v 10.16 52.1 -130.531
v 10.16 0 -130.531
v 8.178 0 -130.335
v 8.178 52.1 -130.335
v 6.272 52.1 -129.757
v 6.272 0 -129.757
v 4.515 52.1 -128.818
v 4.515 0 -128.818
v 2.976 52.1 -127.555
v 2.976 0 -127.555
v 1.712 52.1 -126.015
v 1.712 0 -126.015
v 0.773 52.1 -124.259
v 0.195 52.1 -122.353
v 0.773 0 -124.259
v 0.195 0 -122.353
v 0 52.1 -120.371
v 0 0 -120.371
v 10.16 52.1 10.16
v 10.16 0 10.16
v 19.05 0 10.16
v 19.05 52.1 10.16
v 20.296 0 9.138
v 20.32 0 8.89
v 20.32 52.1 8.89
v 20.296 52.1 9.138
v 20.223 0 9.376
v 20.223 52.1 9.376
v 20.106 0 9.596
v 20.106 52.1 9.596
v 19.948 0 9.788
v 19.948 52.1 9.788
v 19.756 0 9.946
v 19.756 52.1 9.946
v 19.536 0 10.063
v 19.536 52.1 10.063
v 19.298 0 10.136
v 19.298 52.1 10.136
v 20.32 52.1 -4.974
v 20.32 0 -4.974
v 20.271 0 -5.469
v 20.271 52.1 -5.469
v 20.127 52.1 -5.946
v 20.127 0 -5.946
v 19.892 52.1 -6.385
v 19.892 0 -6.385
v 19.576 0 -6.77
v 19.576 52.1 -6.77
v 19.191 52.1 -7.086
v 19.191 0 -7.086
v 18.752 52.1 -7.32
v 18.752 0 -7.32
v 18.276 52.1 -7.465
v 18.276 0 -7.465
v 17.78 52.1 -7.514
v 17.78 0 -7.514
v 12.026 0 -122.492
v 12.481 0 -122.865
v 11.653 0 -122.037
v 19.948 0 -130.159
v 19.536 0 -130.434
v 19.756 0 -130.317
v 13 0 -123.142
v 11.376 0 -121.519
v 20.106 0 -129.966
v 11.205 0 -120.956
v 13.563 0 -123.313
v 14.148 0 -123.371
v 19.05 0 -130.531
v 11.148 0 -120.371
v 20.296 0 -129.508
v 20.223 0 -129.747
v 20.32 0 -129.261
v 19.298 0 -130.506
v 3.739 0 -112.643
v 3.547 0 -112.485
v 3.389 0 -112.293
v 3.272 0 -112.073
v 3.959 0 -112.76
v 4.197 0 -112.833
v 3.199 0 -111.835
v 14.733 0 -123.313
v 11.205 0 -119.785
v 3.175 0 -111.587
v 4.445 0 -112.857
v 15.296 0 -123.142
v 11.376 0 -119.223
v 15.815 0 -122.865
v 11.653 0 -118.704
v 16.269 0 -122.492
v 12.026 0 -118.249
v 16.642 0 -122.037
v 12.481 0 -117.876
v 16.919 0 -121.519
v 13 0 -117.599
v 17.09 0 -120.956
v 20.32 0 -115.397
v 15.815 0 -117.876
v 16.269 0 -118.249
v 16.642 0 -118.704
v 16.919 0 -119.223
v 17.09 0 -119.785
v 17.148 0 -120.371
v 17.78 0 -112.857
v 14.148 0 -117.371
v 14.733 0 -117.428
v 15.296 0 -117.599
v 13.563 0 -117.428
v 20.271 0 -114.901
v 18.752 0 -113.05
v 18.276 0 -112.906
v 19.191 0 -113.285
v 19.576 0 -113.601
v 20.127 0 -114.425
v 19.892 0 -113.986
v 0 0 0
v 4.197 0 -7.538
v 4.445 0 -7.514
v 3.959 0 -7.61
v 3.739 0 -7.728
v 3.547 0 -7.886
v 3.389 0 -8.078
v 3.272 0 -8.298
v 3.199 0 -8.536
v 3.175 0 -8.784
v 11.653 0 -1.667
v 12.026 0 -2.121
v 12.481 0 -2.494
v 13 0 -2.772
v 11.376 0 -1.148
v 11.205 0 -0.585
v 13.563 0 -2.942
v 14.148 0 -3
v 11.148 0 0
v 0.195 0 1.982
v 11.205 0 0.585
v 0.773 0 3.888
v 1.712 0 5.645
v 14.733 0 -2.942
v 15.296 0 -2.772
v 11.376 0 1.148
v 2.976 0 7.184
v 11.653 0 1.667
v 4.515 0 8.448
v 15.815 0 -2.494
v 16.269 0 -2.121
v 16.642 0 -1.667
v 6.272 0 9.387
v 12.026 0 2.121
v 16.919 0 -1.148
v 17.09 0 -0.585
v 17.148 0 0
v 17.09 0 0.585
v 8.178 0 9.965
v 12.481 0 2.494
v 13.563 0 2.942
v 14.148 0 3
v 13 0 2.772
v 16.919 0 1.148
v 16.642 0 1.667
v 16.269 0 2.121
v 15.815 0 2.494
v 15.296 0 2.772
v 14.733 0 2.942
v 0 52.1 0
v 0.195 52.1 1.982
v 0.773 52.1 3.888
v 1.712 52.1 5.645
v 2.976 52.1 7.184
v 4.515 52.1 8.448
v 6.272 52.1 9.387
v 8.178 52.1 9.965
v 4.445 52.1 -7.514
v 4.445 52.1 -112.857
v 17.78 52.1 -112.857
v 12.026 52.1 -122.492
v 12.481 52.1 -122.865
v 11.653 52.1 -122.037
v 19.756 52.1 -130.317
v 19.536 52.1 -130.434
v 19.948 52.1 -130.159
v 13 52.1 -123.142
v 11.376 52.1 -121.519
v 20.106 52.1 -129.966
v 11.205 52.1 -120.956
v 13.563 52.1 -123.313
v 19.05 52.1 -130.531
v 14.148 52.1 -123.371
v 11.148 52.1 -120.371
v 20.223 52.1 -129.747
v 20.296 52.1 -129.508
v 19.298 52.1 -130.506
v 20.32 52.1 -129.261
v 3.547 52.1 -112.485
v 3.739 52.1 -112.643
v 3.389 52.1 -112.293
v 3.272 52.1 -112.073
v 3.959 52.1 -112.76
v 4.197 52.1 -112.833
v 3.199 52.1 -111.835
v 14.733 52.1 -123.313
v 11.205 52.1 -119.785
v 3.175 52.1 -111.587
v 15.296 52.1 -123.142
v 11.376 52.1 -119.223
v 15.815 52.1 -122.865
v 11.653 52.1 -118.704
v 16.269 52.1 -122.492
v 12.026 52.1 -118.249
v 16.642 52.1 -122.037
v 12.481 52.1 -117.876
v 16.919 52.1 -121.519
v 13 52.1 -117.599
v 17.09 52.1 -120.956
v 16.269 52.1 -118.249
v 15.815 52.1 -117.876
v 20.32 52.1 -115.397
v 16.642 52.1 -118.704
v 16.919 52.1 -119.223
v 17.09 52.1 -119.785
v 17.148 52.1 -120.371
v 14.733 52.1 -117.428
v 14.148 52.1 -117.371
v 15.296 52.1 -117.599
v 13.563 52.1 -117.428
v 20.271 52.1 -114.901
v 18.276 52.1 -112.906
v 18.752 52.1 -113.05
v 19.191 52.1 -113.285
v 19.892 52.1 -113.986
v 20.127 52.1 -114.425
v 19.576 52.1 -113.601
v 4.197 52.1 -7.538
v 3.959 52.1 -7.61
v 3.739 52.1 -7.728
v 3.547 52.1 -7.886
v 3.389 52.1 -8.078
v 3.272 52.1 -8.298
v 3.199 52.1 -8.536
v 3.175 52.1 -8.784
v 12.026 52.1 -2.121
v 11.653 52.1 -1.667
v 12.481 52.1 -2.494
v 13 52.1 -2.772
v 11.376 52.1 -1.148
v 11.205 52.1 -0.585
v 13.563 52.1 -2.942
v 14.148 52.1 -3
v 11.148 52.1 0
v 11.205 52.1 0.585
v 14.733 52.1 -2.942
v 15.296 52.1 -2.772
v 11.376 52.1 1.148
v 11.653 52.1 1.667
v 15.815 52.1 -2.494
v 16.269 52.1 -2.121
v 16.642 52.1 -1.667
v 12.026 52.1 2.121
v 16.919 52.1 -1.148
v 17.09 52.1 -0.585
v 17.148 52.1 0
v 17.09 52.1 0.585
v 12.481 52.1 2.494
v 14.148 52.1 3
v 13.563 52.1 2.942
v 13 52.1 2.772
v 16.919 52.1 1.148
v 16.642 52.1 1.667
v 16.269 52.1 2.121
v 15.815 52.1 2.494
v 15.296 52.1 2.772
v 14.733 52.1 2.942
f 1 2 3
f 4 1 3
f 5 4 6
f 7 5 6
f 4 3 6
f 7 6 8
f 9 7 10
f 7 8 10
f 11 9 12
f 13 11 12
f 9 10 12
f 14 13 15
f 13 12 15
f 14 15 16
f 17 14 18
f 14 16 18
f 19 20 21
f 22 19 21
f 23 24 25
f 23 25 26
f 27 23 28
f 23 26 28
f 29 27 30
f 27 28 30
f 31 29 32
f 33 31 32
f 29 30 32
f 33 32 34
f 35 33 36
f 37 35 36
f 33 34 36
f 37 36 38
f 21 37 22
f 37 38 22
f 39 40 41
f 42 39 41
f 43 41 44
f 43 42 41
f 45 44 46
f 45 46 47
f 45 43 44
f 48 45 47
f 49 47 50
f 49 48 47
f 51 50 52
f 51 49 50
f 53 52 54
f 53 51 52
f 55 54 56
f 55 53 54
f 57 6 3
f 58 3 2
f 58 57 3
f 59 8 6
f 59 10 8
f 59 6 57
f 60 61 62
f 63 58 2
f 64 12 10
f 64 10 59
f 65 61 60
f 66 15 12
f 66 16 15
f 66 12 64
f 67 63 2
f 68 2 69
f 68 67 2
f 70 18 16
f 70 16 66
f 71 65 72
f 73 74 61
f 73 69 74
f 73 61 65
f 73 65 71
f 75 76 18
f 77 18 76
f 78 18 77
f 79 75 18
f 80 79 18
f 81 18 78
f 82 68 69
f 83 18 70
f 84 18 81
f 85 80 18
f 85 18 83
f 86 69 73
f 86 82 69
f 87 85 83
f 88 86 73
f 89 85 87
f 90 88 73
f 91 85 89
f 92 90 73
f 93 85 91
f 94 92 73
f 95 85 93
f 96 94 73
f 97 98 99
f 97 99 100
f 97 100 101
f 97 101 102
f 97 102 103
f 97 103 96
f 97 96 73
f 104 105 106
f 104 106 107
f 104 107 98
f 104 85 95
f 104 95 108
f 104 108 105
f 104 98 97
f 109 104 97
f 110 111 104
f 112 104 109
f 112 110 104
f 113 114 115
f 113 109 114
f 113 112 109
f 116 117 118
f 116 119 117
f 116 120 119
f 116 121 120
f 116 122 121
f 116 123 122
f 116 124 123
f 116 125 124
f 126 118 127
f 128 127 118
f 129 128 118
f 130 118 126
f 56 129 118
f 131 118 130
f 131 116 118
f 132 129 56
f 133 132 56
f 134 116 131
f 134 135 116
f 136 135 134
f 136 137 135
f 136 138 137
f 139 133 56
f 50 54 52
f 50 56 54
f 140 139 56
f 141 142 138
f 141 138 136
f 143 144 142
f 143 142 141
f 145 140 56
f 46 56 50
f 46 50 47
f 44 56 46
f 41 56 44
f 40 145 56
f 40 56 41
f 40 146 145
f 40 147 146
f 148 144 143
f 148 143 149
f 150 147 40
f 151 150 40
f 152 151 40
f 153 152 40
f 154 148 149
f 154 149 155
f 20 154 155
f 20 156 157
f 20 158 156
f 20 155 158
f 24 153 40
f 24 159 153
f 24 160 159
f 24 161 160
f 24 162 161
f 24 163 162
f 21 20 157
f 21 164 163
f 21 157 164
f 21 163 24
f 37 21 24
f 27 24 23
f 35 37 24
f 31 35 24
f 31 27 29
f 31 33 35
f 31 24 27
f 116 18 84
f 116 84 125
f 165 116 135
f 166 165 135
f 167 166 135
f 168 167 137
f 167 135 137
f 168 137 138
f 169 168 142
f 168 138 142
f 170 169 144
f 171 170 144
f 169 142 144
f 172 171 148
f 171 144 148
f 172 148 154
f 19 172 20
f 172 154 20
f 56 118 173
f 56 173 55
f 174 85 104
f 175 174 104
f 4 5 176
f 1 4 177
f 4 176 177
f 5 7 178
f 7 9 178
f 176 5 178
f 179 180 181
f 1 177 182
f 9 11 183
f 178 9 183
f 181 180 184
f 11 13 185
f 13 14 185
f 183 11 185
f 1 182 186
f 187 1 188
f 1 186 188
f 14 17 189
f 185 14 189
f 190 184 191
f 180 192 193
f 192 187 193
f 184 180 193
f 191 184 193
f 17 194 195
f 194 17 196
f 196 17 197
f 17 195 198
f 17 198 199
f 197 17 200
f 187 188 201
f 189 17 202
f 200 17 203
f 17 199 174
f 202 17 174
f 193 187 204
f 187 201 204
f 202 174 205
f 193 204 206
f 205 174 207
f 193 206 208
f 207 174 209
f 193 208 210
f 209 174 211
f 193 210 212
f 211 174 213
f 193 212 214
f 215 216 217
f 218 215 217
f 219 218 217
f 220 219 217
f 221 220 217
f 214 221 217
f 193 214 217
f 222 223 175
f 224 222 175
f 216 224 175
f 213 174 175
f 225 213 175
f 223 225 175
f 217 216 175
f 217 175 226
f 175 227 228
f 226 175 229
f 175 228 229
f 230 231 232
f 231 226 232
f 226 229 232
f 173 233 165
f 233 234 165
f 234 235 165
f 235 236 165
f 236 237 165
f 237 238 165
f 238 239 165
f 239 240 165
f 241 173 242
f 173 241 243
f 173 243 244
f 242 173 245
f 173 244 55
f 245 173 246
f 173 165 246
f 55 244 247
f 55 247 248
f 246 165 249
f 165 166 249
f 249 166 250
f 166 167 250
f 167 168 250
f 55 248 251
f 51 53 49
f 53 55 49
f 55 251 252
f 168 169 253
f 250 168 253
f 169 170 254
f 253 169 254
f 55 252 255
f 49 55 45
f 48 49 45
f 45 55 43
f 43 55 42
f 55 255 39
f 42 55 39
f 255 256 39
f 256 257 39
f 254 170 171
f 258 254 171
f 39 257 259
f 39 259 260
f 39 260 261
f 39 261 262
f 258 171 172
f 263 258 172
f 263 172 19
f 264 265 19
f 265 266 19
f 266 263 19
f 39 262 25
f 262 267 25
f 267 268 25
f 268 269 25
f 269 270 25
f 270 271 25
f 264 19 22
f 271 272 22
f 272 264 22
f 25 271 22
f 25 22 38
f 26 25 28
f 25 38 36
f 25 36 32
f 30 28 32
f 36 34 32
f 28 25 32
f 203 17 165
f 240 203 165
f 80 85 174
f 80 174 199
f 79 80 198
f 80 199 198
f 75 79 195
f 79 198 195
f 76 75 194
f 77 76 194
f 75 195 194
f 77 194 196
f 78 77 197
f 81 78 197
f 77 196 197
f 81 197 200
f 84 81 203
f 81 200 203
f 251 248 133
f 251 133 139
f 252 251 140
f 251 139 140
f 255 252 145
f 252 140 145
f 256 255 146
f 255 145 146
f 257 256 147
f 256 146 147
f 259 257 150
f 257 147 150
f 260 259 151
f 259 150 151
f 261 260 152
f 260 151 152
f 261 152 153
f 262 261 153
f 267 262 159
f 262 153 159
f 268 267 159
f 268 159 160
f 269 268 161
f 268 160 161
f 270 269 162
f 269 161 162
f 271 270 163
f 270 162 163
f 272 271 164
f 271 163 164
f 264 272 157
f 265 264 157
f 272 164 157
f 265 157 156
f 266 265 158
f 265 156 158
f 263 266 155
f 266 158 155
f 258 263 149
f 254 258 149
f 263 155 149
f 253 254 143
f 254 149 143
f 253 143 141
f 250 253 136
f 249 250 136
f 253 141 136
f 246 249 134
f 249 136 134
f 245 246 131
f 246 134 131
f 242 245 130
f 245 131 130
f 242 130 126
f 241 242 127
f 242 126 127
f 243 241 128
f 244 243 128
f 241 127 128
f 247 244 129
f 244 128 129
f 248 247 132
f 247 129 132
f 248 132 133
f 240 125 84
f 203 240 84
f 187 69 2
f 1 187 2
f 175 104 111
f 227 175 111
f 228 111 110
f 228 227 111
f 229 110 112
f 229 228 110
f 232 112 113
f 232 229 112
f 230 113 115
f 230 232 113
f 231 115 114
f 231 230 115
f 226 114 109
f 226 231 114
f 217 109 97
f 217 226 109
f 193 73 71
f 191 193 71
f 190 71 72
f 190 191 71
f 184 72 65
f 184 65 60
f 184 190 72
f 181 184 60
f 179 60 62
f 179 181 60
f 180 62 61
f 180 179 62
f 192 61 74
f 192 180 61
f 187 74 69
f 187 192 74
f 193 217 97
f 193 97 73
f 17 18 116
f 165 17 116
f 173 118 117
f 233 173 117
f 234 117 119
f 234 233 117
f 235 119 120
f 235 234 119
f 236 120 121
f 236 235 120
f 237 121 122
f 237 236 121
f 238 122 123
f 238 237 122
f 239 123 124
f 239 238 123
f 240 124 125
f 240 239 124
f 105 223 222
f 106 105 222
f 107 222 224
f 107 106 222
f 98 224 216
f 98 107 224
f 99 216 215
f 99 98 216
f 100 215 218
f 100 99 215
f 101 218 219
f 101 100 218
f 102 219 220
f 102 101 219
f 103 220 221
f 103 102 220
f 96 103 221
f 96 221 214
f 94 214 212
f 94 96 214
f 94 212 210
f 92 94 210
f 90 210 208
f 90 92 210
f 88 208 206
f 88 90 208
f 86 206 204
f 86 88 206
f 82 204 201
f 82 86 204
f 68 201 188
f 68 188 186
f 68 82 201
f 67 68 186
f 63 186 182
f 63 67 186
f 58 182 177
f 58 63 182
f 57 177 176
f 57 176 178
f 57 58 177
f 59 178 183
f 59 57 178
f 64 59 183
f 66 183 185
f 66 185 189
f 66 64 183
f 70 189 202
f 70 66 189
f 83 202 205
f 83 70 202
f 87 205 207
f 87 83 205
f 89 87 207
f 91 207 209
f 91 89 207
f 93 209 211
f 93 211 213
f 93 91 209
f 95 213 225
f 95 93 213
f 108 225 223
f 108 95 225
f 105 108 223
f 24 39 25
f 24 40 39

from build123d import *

# Parameters (mm, degrees)
BOSS_EXTRUDE1_DEPTH  = 52.09999994
BOSS_EXTRUDE2_START  = -52.09999994
SKETCH2_R            = 3
BOSS_EXTRUDE2_DEPTH  = 52.09999994
FILLET1_R            = 2.54
FILLET2_R            = 1.27
FILLET2_OF_MIRROR1_R = 1.27
FILLET3_R            = 1.27
FILLET4_R            = 2.54


with BuildPart() as part:
    # Sketch1 → Boss-Extrude1 (new body)
    with BuildSketch(Plane(origin=(0, 0, 0), x_dir=(1, 0, 0), z_dir=(0, 1, 0))):
        with BuildLine():
            Line((0, 120.3706), (0, 0))
            Line((0, 0), (3.175, 0))
            Line((3.175, 0), (3.175, 120.3706))
            ThreePointArc((3.175, 120.3706), (5.220859133, 125.309740867), (10.16, 127.3556))
            Line((10.16, 127.3556), (20.32, 127.3556))
            Line((20.32, 127.3556), (20.32, 130.5306))
            Line((20.32, 130.5306), (10.16, 130.5306))
            ThreePointArc((10.16, 130.5306), (2.975795103, 127.554804897), (0, 120.3706))
        make_face()
        with BuildLine():
            Line((3.175, 0), (0, 0))
            ThreePointArc((0, 0), (2.975795103, -7.184204897), (10.16, -10.16))
            Line((10.16, -10.16), (20.32, -10.16))
            Line((20.32, -10.16), (20.32, -6.985))
            Line((20.32, -6.985), (10.16, -6.985))
            ThreePointArc((10.16, -6.985), (5.220859133, -4.939140867), (3.175, 0))
        make_face()
    extrude(amount=BOSS_EXTRUDE1_DEPTH)

    # Sketch2 → Boss-Extrude2 (add)
    with BuildSketch(Plane(origin=(0, 52.09999994, 0), x_dir=(1, 0, 0), z_dir=(0, 1, 0)).offset(BOSS_EXTRUDE2_START)):
        with BuildLine():
            Line((3.175, 112.856959641), (10.16, 112.856959641))
            Line((10.16, 112.856959641), (20.32, 112.856959641))
            Line((20.32, 112.856959641), (20.32, 127.3556))
            Line((20.32, 127.3556), (10.16, 127.3556))
            ThreePointArc((10.16, 127.3556), (5.220859133, 125.309740867), (3.175, 120.3706))
            Line((3.175, 120.3706), (3.175, 112.856959641))
        make_face()
        with Locations(Location((14.1478, 120.3706, 0), (0, 0, 270))):
            Circle(SKETCH2_R, mode=Mode.SUBTRACT)
    boss_extrude2 = extrude(amount=BOSS_EXTRUDE2_DEPTH)

    # Fillet1
    fillet1_edges = [part.edges().sort_by_distance(p)[0] for p in [
        (20.32, 26.04999997, -112.856959641),
    ]]
    fillet(fillet1_edges, radius=FILLET1_R)

    # Fillet2
    fillet2_edges = [part.edges().sort_by_distance(p)[0] for p in [
        (3.175, 26.04999997, -112.856959641),
    ]]
    fillet(fillet2_edges, radius=FILLET2_R)

    # Mirror1: Boss-Extrude2 across plane
    add(boss_extrude2.mirror(Plane(origin=(0, 0, -60.1853), x_dir=(1, 0, 0), z_dir=(0, 0, -1))))

    # Fillet2 of Mirror1
    fillet2_of_mirror1_edges = [part.edges().sort_by_distance(p)[0] for p in [
        (3.175, 26.04999997, -7.513640359),
    ]]
    fillet(fillet2_of_mirror1_edges, radius=FILLET2_OF_MIRROR1_R)

    # Fillet3
    fillet3_edges = [part.edges().sort_by_distance(p)[0] for p in [
        (20.32, 26.04999997, 10.16),
        (20.32, 26.04999997, -130.5306),
    ]]
    fillet(fillet3_edges, radius=FILLET3_R)

    # Fillet4
    fillet4_edges = [part.edges().sort_by_distance(p)[0] for p in [
        (20.32, 26.04999997, -7.513640359),
    ]]
    fillet(fillet4_edges, radius=FILLET4_R)


solid = part.part
